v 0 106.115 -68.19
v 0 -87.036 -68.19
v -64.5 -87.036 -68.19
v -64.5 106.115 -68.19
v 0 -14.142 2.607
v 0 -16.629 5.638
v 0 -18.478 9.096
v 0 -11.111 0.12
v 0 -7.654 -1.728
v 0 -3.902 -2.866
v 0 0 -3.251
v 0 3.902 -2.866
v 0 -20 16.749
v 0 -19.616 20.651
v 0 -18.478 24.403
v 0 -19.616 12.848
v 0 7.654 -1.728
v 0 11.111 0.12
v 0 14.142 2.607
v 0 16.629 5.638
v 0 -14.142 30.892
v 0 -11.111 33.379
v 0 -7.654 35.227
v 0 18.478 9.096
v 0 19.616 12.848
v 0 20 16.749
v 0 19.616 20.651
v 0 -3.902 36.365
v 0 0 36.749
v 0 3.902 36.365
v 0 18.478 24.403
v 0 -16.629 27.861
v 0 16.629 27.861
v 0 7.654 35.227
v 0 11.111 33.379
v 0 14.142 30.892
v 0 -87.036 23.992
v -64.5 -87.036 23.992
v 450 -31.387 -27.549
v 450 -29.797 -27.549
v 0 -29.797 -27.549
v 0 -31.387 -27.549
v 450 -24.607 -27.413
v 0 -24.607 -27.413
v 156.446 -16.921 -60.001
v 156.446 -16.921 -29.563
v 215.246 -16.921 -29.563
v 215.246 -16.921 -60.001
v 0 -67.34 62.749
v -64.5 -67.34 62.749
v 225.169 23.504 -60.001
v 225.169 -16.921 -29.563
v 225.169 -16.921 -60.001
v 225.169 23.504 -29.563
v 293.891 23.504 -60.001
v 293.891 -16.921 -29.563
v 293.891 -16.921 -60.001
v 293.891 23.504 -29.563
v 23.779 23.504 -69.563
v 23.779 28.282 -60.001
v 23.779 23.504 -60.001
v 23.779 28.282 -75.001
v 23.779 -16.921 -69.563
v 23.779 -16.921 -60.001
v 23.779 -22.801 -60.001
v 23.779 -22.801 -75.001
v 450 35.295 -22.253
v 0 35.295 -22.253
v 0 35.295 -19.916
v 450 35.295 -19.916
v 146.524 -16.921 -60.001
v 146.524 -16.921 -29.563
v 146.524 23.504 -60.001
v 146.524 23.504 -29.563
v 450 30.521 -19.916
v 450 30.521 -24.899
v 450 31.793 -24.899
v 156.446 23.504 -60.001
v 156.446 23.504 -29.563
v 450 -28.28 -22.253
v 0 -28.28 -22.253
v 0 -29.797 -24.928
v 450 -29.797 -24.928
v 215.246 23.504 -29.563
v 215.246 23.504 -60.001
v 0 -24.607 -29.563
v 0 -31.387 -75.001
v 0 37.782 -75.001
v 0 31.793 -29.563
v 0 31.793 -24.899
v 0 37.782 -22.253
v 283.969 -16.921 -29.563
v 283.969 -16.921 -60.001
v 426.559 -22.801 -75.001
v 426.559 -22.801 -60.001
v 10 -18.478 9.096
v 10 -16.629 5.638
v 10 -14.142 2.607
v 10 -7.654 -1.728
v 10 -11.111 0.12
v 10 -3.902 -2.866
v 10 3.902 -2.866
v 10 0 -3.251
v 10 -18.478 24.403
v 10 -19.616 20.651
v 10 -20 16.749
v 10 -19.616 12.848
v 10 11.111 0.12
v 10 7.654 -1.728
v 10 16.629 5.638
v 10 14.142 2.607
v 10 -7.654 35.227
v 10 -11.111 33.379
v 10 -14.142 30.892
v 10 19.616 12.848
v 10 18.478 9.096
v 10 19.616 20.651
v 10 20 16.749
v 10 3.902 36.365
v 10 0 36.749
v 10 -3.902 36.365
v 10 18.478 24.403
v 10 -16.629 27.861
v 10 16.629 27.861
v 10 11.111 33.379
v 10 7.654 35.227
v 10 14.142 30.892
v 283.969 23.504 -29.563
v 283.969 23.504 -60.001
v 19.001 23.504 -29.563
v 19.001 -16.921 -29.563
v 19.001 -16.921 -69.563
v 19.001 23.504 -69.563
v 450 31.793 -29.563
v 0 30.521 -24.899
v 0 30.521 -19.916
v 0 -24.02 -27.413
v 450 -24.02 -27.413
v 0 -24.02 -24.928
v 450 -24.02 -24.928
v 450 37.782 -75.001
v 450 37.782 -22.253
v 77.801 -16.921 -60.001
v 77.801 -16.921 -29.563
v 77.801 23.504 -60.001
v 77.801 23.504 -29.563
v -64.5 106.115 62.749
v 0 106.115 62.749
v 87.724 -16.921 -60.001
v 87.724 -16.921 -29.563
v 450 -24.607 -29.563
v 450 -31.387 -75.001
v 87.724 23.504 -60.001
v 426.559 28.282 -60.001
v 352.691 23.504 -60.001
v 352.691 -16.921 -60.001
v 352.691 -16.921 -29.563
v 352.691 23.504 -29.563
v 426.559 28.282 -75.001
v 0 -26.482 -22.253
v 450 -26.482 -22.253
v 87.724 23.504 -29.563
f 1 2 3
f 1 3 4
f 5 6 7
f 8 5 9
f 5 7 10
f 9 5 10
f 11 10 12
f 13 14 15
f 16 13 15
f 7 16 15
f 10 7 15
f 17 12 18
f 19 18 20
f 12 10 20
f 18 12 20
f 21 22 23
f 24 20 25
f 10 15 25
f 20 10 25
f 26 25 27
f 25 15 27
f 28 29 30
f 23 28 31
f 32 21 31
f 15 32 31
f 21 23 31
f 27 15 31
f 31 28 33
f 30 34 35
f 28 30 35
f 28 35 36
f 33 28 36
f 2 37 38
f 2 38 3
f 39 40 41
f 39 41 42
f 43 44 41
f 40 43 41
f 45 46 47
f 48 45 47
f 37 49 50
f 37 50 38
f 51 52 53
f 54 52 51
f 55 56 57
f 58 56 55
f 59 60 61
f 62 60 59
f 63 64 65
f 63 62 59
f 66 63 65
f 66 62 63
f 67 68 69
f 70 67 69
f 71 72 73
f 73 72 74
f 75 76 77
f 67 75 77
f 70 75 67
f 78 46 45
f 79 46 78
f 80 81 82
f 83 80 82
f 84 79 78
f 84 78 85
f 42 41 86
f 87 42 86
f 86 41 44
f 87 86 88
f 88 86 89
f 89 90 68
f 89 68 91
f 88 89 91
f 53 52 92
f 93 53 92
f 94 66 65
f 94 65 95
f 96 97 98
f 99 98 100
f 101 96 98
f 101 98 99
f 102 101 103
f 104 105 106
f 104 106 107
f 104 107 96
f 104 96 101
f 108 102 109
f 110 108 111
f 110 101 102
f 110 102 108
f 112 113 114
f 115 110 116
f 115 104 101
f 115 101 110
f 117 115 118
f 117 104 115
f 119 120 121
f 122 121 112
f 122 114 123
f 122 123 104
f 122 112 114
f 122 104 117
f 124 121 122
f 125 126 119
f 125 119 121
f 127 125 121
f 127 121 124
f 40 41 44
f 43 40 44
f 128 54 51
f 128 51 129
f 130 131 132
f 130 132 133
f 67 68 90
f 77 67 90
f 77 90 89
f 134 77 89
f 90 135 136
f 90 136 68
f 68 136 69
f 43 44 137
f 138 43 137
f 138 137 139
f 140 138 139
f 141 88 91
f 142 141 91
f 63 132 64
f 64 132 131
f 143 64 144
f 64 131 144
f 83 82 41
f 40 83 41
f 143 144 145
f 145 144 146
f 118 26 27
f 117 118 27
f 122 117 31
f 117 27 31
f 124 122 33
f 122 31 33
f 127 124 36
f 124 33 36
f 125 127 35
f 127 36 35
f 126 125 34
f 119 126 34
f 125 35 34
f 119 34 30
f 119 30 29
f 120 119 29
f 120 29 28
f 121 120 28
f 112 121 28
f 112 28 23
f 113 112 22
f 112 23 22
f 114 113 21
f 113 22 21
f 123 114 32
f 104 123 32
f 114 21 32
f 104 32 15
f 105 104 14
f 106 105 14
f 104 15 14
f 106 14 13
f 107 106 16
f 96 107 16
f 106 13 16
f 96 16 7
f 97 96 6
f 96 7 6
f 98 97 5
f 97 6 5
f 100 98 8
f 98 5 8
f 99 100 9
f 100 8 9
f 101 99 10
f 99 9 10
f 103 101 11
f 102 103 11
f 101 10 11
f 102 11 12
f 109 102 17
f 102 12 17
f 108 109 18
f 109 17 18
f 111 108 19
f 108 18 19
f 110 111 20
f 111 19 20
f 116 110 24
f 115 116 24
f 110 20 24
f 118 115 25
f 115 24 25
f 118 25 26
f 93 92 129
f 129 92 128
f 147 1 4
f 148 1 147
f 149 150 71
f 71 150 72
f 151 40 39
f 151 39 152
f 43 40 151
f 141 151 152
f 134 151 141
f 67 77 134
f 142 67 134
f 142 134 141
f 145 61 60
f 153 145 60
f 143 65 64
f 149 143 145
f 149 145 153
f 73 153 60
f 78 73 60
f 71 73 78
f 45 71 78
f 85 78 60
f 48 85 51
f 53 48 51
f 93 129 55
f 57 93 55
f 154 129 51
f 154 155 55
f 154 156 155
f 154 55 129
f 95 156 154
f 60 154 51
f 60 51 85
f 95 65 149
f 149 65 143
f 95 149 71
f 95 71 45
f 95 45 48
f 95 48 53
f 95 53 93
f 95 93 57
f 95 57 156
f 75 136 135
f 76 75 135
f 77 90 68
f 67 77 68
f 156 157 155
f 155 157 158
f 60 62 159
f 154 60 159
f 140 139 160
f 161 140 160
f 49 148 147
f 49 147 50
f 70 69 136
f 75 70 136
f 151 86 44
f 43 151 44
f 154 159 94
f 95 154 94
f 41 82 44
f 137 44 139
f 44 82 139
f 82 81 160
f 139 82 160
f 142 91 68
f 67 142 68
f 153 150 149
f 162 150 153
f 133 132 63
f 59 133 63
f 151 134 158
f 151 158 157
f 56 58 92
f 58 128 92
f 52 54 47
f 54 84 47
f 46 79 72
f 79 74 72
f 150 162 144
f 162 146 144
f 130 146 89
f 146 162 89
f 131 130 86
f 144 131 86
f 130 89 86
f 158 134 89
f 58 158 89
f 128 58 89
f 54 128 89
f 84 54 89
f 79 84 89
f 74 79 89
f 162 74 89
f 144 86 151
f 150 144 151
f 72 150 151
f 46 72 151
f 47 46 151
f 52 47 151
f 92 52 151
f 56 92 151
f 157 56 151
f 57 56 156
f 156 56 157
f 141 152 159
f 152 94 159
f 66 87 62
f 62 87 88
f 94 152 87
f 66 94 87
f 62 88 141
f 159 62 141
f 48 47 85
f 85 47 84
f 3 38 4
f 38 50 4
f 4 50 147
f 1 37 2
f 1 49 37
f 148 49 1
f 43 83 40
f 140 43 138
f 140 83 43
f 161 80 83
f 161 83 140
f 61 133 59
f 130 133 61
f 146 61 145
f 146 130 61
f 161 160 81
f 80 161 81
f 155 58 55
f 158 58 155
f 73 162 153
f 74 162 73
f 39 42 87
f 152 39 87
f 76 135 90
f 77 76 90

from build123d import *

# Parameters (mm, degrees)
F0_R     = 20
F1_DEPTH = 64.5
F0_W     = 69.1690184176
F0_H     = 6.8107743772
F2_DEPTH = 450
F3_W     = 402.7799852192
F3_H     = 51.0824993253
F4_DEPTH = 15
F5_W     = 58.800008148
F5_H     = 40.4249988496
F6_DEPTH = 40
F7_DEPTH = 450
F8_DEPTH = 10


# Not quite as in the source:
# - a feature names something its author has since deleted; it is built from what else it names


with BuildPart() as f1:
    # F0 (on Right) → F1 (new body)
    with BuildSketch(Plane.YZ):
        Polygon((-87.0358720422, 23.9922005967), (-87.0358720422, -68.190318747), (-31.3871668349, -68.190318747), (-31.3871668349, -27.5489028139), (-29.7969614784, -27.5489028139), (-29.7969614784, -24.9276731835), (-28.2796746202, -22.2527954323), (-26.482412375, -22.2527954323), (-24.0200519564, -24.9276731835), (-24.0200519564, -27.412929792), (-24.6065106683, -27.412929792), (-24.6065106683, -29.5631634037), (31.7927369408, -29.5631634037), (31.7927369408, -24.8985635082), (30.5205726556, -24.8985635082), (30.5205726556, -19.9159244041), (35.2954028477, -19.9159244041), (35.2954028477, -22.2527954323), (37.7818515827, -22.2527954323), (37.7818515827, -68.190318747), (106.1147302389, -68.190318747), (106.1147302389, 62.7493981556), (-67.339591682, 62.7493981556), align=None)
        with Locations((0, 16.7493981556)):
            Circle(F0_R, mode=Mode.SUBTRACT)
        Polygon((-31.3871668349, -27.5489028139), (-31.3871668349, -68.190318747), (37.7818515827, -68.190318747), (37.7818515827, -22.2527954323), (35.2954028477, -22.2527954323), (31.7927369408, -24.8985635082), (31.7927369408, -29.5631634037), (-24.6065106683, -29.5631634037), (-24.6065106683, -27.412929792), (-29.7969614784, -27.5489028139), align=None)
        with Locations((0, 16.7493981556)):
            Circle(F0_R)
        Polygon((-29.7969614784, -24.9276731835), (-29.7969614784, -27.5489028139), (-24.6065106683, -27.412929792), (-24.0200519564, -27.412929792), (-24.0200519564, -24.9276731835), (-26.482412375, -22.2527954323), (-28.2796746202, -22.2527954323), align=None)
        Polygon((31.7927369408, -24.8985635082), (35.2954028477, -22.2527954323), (35.2954028477, -19.9159244041), (30.5205726556, -19.9159244041), (30.5205726556, -24.8985635082), align=None)
    extrude(amount=-F1_DEPTH)


with BuildPart() as f2:
    # F0 (on Right) → F2 (new body)
    with BuildSketch(Plane.YZ):
        with Locations((3.1973423739, -71.5957059356)):
            Rectangle(F0_W, F0_H)
        Polygon((-31.3871668349, -27.5489028139), (-31.3871668349, -68.190318747), (37.7818515827, -68.190318747), (37.7818515827, -22.2527954323), (35.2954028477, -22.2527954323), (31.7927369408, -24.8985635082), (31.7927369408, -29.5631634037), (-24.6065106683, -29.5631634037), (-24.6065106683, -27.412929792), (-29.7969614784, -27.5489028139), align=None)
    extrude(amount=F2_DEPTH)

    # F3 (on face) → F4 (cut)
    with BuildSketch(Plane(origin=(0, 0, -75.0010931242), x_dir=(1, 0, 0), z_dir=(0, 0, -1))):
        with Locations((225.1687403768, -2.7406793088)):
            Rectangle(F3_W, F3_H)
    extrude(amount=-F4_DEPTH, mode=Mode.SUBTRACT)

    # F5 (on face) → F6 (cut)
    with BuildSketch(Plane.XY.offset(-29.5631634037)):
        with Locations((48.4012458473, 3.2919291407)):
            Rectangle(F5_W, F5_H)
        with Locations((323.291266337, 3.2919291407)):
            Rectangle(F5_W, F5_H)
        with Locations((117.1237509698, 3.2919291407)):
            Rectangle(F5_W, F5_H)
        with Locations((185.8462560922, 3.2919291407)):
            Rectangle(F5_W, F5_H)
        with Locations((254.5687612146, 3.2919291407)):
            Rectangle(F5_W, F5_H)
    extrude(amount=-F6_DEPTH, mode=Mode.SUBTRACT)


with BuildPart() as f7:
    # F0 (on Right) → F7 (new body)
    with BuildSketch(Plane.YZ):
        Polygon((-29.7969614784, -24.9276731835), (-29.7969614784, -27.5489028139), (-24.6065106683, -27.412929792), (-24.0200519564, -27.412929792), (-24.0200519564, -24.9276731835), (-26.482412375, -22.2527954323), (-28.2796746202, -22.2527954323), align=None)
    extrude(amount=F7_DEPTH)


with BuildPart() as f7b:
    # F0 (on Right) → F7, piece 2 (new body)
    with BuildSketch(Plane.YZ):
        Polygon((31.7927369408, -24.8985635082), (35.2954028477, -22.2527954323), (35.2954028477, -19.9159244041), (30.5205726556, -19.9159244041), (30.5205726556, -24.8985635082), align=None)
    extrude(amount=F7_DEPTH)


with BuildPart() as f8:
    # F0 (on Right) → F8 (new body)
    with BuildSketch(Plane.YZ):
        with Locations((0, 16.7493981556)):
            Circle(F0_R)
    extrude(amount=F8_DEPTH)


solid = Compound([f1.part, f2.part, f7.part, f7b.part, f8.part])
